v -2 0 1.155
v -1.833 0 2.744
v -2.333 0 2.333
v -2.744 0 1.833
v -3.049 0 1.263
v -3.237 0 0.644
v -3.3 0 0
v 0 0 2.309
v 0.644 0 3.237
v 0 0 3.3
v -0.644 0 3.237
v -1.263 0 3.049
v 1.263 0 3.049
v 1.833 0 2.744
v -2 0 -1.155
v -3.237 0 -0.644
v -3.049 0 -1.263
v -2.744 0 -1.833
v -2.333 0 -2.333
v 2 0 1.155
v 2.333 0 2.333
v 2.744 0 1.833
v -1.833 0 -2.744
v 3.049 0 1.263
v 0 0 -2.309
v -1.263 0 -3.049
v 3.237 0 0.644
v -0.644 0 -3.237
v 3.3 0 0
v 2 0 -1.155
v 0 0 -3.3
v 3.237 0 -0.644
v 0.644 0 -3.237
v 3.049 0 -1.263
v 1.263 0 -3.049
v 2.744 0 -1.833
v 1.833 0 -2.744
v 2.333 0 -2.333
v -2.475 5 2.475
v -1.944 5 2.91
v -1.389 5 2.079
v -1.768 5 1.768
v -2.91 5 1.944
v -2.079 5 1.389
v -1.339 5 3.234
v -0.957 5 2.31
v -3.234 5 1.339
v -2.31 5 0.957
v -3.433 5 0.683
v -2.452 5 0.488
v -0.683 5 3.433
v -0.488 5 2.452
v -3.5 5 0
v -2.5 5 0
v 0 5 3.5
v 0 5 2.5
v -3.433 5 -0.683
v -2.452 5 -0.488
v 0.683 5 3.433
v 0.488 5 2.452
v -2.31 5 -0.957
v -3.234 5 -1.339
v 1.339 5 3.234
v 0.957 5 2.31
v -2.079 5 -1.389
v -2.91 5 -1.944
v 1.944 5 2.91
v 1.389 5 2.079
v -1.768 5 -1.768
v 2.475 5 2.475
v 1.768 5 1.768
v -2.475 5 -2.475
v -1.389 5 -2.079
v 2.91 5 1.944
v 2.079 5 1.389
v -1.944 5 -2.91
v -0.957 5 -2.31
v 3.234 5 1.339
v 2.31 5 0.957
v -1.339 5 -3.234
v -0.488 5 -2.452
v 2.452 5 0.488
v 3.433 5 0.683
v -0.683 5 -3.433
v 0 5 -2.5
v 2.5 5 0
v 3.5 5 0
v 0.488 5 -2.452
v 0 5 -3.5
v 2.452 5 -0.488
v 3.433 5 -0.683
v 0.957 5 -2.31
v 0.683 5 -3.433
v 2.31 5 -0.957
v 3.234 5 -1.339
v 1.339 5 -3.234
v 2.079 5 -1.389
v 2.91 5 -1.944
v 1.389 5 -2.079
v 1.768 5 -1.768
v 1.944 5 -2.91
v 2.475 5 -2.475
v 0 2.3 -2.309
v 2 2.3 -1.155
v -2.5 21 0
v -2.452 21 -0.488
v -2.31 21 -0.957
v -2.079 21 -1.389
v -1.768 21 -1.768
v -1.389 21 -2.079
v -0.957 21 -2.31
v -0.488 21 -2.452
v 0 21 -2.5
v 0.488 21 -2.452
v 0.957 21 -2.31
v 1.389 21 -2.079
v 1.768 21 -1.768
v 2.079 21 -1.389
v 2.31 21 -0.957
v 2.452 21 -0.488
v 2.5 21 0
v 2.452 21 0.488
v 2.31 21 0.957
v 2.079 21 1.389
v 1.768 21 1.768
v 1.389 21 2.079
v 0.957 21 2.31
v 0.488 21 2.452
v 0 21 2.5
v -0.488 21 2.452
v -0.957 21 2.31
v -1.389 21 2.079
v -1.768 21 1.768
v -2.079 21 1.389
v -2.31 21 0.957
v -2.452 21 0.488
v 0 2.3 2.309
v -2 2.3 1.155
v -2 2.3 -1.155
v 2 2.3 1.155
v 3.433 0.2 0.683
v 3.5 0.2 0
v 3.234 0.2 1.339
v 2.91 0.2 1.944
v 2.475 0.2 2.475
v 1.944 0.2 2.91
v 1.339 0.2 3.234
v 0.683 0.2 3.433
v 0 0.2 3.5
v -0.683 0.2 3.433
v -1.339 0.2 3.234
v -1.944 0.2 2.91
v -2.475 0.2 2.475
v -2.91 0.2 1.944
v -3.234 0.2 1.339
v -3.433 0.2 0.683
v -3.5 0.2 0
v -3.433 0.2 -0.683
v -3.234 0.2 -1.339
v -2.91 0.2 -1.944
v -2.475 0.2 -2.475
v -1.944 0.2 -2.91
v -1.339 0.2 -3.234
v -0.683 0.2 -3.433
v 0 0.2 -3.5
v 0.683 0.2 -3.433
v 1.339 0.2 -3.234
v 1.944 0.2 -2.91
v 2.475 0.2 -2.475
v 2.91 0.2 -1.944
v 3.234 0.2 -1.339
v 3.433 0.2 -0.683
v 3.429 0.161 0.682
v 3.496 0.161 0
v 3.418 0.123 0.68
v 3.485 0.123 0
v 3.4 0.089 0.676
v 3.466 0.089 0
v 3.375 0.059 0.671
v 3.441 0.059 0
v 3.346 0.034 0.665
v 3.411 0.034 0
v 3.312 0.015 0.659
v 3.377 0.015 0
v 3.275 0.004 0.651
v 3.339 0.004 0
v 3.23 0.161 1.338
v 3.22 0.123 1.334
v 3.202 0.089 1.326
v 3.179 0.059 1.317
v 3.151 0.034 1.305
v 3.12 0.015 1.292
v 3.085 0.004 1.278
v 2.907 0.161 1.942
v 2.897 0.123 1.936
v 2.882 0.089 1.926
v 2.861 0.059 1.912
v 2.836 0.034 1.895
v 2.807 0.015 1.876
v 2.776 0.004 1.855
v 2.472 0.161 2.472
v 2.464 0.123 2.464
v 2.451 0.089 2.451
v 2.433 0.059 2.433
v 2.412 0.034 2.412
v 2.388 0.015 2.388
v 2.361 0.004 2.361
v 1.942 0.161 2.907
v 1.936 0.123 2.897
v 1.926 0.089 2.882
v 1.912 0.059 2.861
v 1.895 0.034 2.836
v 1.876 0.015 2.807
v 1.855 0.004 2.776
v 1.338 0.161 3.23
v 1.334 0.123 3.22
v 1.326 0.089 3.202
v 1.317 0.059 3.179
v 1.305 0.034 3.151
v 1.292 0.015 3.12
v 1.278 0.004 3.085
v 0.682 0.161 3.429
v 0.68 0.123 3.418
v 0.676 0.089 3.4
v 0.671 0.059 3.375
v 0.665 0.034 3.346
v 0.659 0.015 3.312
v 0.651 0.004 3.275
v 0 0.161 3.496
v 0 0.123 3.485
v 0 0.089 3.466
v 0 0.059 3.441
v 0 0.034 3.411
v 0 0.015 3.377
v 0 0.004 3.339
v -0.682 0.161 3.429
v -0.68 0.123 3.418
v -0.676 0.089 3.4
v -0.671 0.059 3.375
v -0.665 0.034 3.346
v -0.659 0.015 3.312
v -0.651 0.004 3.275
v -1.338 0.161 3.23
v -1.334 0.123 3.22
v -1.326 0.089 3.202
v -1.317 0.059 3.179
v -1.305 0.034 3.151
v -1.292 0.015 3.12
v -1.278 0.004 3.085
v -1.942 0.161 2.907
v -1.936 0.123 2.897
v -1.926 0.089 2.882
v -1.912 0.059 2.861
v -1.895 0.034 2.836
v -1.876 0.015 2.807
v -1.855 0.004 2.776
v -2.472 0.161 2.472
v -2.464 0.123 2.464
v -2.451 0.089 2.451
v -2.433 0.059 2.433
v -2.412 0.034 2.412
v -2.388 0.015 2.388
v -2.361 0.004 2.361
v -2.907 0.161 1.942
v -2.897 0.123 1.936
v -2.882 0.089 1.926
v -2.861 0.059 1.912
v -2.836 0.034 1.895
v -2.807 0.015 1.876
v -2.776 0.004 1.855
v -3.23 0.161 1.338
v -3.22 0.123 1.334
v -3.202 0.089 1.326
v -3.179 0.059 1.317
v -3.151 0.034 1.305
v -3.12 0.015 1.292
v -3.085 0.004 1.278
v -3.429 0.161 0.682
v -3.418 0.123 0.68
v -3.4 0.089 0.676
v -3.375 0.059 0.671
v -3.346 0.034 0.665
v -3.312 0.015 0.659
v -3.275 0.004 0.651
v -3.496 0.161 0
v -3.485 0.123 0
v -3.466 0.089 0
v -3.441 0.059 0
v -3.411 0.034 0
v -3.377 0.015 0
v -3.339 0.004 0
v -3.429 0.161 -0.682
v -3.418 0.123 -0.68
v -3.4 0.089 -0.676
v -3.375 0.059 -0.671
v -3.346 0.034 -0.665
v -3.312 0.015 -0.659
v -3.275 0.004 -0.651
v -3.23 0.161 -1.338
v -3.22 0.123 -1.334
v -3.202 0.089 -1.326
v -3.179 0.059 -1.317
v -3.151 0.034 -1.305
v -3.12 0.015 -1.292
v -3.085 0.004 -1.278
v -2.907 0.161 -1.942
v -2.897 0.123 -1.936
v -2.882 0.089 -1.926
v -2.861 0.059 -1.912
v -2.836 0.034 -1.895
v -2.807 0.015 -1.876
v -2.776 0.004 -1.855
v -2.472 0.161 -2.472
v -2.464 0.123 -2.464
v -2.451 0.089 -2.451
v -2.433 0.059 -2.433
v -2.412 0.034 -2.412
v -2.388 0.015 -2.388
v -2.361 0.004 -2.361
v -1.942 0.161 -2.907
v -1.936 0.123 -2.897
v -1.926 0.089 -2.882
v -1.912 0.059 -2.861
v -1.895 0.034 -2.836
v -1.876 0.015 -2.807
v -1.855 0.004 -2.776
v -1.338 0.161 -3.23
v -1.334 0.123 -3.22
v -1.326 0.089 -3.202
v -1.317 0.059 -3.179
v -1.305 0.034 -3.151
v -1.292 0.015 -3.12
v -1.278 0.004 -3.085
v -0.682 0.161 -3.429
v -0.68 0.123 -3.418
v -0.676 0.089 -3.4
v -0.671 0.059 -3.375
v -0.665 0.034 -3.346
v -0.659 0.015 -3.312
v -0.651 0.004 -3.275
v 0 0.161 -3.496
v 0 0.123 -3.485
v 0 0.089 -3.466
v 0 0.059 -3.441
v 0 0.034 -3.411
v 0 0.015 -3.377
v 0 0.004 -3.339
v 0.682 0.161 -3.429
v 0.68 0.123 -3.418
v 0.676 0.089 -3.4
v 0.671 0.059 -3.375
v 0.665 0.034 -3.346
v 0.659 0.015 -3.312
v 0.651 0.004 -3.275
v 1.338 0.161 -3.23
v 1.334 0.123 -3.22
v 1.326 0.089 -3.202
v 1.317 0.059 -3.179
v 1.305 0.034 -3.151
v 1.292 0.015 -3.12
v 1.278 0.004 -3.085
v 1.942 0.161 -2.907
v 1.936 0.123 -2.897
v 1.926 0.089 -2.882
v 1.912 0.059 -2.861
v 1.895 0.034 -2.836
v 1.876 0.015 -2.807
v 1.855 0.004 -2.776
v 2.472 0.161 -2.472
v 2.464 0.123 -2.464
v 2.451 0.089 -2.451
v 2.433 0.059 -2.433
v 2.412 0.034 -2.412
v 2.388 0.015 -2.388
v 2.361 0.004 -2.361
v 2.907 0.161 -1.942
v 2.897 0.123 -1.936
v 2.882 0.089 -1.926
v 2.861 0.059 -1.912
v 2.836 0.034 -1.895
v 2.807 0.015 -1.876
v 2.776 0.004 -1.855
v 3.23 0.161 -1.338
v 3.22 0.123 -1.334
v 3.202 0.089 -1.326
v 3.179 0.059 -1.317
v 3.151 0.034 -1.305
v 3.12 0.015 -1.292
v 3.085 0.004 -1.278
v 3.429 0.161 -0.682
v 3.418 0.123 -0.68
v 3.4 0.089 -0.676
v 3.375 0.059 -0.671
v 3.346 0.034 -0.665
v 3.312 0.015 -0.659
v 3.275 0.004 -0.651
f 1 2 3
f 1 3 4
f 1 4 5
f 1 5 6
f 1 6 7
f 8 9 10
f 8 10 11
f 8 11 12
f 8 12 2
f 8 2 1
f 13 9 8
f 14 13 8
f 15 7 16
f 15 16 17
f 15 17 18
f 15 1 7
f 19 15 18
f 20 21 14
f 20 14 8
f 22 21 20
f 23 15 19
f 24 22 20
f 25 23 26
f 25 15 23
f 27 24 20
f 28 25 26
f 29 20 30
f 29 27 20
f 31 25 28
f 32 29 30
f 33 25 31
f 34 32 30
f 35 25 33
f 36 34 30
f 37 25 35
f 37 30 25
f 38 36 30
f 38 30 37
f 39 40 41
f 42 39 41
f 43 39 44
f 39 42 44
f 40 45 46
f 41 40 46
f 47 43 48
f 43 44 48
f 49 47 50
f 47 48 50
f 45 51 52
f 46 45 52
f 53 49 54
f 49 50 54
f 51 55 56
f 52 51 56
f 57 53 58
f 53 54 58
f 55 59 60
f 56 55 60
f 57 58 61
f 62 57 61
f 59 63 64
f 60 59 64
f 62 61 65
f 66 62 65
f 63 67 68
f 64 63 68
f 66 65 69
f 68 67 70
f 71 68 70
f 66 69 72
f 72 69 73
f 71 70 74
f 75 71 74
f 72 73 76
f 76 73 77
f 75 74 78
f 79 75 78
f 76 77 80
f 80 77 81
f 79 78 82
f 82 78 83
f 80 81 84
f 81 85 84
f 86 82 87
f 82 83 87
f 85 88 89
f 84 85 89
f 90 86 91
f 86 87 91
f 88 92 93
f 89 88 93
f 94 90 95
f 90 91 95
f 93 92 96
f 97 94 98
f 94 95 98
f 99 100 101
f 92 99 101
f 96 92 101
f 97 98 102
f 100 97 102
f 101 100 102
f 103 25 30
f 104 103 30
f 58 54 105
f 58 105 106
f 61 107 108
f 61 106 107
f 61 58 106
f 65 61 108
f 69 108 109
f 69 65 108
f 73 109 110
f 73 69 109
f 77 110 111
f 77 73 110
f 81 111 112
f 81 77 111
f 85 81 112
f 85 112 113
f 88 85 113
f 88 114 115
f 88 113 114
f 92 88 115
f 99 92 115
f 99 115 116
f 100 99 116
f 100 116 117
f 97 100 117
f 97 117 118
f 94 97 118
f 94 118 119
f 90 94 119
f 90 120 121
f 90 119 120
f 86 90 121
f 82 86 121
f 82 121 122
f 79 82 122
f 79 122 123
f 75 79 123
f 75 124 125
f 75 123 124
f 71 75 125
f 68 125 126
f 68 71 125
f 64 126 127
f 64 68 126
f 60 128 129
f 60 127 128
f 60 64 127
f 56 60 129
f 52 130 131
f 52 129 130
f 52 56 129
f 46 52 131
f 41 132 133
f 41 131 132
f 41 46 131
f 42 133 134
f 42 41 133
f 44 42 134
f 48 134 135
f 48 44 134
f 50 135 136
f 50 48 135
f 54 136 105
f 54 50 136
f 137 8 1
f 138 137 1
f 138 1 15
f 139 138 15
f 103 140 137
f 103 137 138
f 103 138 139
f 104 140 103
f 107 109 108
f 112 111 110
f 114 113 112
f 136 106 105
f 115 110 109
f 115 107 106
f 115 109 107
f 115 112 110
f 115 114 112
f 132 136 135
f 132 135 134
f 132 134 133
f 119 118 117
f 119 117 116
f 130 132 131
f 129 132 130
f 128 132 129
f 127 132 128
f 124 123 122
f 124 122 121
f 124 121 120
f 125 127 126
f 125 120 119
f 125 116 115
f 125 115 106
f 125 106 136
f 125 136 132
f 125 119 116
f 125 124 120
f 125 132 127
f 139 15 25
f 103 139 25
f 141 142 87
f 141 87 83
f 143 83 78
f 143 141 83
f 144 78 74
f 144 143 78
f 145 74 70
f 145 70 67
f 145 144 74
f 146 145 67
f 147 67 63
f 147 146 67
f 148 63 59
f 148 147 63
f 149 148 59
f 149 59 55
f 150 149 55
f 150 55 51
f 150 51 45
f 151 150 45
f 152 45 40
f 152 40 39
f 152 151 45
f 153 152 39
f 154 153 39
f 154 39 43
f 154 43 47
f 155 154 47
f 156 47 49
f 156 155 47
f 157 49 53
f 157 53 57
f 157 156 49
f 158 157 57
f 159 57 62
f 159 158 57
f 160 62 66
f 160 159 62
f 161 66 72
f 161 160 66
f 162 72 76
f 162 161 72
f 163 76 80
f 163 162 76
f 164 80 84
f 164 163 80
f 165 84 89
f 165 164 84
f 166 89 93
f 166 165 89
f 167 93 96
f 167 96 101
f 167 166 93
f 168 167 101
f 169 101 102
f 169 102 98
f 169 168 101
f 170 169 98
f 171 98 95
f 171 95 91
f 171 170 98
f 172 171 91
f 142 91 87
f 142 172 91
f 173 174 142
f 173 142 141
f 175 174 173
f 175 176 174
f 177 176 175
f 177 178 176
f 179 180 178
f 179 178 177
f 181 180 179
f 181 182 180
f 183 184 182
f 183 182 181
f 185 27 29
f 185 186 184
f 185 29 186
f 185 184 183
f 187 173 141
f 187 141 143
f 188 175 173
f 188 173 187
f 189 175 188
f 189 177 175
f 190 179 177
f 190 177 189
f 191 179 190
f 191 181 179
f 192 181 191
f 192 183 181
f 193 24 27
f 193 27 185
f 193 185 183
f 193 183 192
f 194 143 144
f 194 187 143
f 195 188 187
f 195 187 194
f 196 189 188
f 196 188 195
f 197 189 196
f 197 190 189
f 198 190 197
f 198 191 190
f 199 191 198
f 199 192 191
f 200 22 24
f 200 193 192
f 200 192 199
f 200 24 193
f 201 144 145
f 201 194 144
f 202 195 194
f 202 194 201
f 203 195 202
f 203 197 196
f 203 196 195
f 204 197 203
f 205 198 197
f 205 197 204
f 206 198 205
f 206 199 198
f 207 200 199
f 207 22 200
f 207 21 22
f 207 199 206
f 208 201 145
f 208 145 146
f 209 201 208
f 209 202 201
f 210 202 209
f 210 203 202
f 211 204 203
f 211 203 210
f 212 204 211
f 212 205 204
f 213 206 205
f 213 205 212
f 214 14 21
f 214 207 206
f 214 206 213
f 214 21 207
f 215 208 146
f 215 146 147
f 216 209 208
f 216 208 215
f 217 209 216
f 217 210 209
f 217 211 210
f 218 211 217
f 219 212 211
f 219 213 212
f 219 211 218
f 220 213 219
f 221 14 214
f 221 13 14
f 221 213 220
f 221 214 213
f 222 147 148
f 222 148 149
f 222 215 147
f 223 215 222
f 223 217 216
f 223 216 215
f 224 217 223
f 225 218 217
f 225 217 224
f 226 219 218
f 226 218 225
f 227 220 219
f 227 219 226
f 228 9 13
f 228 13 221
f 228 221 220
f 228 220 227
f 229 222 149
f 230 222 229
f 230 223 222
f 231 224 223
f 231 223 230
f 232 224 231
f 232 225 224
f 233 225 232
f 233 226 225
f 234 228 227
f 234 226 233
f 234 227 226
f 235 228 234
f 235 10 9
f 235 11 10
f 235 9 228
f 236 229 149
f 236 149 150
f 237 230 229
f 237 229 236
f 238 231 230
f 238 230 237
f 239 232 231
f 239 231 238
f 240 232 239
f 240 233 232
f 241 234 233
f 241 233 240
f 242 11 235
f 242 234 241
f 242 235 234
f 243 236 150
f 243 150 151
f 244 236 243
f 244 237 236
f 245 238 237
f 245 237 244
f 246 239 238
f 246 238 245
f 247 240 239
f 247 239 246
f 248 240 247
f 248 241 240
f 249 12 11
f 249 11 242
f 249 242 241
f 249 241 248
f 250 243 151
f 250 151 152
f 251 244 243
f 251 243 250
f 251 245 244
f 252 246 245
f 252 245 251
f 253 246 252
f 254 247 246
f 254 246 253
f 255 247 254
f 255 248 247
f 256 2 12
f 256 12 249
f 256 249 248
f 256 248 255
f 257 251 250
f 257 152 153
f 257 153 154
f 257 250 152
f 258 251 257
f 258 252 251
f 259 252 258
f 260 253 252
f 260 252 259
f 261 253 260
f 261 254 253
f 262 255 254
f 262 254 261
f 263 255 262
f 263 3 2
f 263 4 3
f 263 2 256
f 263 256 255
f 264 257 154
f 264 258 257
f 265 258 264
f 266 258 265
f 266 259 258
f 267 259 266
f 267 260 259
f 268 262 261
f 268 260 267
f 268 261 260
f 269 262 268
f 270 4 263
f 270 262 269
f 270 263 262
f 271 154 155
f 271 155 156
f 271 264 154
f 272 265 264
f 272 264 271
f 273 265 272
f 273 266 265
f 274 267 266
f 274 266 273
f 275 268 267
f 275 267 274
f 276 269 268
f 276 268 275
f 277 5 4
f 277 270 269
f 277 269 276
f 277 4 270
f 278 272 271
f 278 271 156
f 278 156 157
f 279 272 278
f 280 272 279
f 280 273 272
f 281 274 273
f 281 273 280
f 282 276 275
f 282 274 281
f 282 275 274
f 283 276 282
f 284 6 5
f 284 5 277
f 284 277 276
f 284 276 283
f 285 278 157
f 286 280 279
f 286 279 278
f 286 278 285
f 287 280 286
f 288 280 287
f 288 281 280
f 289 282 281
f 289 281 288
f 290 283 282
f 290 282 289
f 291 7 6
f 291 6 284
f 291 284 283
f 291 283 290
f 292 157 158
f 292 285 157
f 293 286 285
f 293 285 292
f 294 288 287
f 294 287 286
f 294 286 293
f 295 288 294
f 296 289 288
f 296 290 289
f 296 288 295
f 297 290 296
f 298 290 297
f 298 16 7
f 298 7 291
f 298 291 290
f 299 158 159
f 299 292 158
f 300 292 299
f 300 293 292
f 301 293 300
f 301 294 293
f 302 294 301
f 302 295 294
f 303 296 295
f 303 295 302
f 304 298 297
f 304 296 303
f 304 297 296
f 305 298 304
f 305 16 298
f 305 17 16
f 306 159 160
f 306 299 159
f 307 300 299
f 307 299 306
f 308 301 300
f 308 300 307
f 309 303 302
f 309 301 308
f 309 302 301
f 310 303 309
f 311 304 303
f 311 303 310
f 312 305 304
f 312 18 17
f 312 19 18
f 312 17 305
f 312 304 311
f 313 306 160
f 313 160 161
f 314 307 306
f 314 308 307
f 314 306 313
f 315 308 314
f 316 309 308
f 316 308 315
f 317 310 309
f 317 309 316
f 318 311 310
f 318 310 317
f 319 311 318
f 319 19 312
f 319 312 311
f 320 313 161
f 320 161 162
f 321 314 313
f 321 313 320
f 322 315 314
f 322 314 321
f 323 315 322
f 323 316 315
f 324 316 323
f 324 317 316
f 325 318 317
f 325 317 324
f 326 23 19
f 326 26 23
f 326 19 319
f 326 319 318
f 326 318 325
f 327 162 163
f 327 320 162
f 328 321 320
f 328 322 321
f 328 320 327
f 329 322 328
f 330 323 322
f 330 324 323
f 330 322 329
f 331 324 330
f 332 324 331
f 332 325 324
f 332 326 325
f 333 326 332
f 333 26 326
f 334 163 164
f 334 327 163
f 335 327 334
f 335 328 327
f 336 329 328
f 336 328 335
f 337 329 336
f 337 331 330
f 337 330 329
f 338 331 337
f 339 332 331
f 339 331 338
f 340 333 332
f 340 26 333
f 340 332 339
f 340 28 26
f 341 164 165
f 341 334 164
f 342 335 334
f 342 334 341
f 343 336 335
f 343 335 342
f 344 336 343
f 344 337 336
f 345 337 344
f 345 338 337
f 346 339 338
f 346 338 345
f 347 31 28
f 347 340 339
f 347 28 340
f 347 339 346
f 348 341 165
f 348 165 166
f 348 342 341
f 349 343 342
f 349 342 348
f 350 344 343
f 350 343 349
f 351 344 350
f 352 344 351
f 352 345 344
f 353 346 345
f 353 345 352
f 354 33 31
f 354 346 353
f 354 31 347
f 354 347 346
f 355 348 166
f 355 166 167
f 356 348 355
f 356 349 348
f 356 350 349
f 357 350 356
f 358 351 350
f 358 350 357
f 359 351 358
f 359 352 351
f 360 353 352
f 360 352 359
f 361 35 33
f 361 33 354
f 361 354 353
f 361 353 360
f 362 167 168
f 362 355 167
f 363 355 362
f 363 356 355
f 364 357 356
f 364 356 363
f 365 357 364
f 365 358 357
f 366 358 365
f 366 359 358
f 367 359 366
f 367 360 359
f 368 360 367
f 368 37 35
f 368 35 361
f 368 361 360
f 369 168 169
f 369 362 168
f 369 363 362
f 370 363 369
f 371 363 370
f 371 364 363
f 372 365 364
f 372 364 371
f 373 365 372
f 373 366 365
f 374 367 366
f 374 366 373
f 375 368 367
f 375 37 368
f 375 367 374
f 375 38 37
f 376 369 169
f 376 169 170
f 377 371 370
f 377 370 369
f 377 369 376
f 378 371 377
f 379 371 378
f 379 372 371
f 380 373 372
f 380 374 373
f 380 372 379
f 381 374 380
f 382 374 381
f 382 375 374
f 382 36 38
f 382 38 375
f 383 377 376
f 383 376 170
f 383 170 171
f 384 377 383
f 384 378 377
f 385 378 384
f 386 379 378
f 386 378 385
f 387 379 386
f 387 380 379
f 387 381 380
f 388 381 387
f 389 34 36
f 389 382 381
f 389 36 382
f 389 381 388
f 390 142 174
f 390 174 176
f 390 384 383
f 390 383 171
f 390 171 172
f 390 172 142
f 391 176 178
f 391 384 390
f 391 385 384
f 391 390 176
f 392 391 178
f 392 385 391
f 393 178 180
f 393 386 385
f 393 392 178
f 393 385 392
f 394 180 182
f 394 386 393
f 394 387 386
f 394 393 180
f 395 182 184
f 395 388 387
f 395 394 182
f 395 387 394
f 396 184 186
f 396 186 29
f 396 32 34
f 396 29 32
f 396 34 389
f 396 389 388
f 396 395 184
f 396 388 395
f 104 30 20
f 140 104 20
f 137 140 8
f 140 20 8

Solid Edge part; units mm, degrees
sketch "Sketch1" plane through (0, 0, 0) normal (0, -1, 0) x (1, 0, 0)
  circle A0 centre (0, 0) radius 3.5
extrude "Protrusion1" add sketch "Sketch1" against normal blind 5
sketch "Sketch2" plane through (0, 5, 0) normal (0, 1, 0) x (-1, 0, 0)
  circle A0 centre (0, 0) radius 2.5
extrude "ExtrudedProtrusion_2" add sketch "Sketch2" along normal blind 16
fillet "Round_1" radius 0.2 1 edges at (-3.5, 0, 0)
sketch "Sketch3" plane through (0, 0, 0) normal (0, -1, 0) x (1, 0, 0)
  line L0 (0, 2.3094) -> (-2, 1.1547)
  line L1 (-2, 1.1547) -> (-2, -1.1547)
  line L2 (-2, -1.1547) -> (0, -2.3094)
  line L3 (0, -2.3094) -> (2, -1.1547)
  line L4 (2, -1.1547) -> (2, 1.1547)
  line L5 (2, 1.1547) -> (0, 2.3094)
extrude "ExtrudedCutout_2" cut sketch "Sketch3" against normal blind 2.3
properties material "Steel"
